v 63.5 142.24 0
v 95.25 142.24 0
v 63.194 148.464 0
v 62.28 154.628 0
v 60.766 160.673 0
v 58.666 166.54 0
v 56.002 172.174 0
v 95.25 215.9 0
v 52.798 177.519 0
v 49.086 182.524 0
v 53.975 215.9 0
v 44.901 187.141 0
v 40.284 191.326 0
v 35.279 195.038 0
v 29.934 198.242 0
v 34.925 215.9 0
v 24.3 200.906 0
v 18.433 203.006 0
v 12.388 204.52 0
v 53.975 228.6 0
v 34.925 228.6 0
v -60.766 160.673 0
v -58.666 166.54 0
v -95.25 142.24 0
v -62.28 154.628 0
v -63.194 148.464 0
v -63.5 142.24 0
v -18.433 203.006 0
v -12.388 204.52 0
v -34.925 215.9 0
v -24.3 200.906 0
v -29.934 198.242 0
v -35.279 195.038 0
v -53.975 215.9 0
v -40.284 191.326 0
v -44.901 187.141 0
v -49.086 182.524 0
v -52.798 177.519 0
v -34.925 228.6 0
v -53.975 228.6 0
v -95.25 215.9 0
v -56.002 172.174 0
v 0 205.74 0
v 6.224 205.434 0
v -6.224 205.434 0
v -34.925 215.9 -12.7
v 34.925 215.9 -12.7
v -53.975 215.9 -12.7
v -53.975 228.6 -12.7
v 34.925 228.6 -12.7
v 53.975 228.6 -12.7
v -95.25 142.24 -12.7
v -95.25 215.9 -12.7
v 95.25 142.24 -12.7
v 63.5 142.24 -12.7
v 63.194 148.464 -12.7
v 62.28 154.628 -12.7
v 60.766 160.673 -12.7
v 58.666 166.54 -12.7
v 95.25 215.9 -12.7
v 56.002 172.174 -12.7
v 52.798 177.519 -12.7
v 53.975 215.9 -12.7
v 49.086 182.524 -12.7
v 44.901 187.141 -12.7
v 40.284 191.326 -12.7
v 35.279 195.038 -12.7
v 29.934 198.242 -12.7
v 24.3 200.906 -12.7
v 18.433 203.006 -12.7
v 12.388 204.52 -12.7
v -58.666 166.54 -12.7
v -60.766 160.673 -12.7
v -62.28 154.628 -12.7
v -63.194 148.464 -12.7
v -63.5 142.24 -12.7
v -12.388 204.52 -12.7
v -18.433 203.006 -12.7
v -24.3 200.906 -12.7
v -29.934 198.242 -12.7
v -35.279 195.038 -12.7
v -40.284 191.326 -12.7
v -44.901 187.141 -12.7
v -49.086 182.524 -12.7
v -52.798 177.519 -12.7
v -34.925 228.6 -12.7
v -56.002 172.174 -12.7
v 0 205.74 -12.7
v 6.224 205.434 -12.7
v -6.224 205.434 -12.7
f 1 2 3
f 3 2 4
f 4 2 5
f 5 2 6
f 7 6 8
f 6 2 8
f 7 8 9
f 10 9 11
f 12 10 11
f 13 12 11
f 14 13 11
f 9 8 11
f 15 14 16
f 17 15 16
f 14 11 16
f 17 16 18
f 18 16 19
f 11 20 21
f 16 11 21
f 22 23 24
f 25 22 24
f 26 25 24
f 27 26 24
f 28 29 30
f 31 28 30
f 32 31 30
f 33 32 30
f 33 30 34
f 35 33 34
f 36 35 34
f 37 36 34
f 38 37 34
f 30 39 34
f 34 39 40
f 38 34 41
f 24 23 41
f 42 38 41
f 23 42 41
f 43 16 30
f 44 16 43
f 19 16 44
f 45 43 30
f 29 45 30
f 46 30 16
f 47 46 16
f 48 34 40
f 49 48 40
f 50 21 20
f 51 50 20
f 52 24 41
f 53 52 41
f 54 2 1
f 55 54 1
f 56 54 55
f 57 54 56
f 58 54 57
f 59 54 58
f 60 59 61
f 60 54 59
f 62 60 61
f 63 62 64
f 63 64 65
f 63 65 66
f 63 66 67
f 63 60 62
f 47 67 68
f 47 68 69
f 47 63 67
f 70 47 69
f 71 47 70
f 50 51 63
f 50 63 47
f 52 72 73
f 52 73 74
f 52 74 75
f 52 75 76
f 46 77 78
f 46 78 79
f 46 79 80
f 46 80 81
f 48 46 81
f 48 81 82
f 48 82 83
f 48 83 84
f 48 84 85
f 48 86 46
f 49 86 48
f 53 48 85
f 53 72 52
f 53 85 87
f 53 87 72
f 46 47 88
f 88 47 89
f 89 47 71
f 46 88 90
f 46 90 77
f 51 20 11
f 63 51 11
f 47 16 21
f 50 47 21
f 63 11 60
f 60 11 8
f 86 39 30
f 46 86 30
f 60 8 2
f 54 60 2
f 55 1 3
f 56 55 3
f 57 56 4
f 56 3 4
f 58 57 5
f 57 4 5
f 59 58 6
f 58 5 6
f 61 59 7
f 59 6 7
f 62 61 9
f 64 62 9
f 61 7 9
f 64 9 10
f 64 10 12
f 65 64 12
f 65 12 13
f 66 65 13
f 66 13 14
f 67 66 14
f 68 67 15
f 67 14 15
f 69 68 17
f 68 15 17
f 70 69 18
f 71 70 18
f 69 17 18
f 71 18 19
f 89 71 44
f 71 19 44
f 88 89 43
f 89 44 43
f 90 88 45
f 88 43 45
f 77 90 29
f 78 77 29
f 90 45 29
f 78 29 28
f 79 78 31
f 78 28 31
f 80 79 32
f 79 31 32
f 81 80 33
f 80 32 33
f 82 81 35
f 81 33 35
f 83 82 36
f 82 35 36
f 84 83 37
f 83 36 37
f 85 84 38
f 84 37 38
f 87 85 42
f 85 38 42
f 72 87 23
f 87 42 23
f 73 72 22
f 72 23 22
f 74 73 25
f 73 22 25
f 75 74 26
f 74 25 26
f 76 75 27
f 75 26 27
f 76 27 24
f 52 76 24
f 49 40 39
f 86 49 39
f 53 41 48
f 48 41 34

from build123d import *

# Parameters (mm, degrees)
EXTRUDE1_DEPTH = 12.7


with BuildPart() as part:
    # Sketch1 → Extrude1 (new body)
    with BuildSketch(Plane.XY):
        with BuildLine():
            Line((95.25, 142.24), (63.5, 142.24))
            ThreePointArc((63.5, 142.24), (0, 205.74), (-63.5, 142.24))
            Line((-63.5, 142.24), (-95.25, 142.24))
            Line((-95.25, 142.24), (-95.25, 215.9))
            Line((-95.25, 215.9), (-53.975, 215.9))
            Line((-53.975, 215.9), (-53.975, 228.6))
            Line((-53.975, 228.6), (-34.925, 228.6))
            Line((-34.925, 228.6), (-34.925, 215.9))
            Line((-34.925, 215.9), (34.925, 215.9))
            Line((34.925, 215.9), (34.925, 228.6))
            Line((34.925, 228.6), (53.975, 228.6))
            Line((53.975, 228.6), (53.975, 215.9))
            Line((53.975, 215.9), (95.25, 215.9))
            Line((95.25, 215.9), (95.25, 142.24))
        make_face()
    extrude(amount=-EXTRUDE1_DEPTH)


solid = part.part
